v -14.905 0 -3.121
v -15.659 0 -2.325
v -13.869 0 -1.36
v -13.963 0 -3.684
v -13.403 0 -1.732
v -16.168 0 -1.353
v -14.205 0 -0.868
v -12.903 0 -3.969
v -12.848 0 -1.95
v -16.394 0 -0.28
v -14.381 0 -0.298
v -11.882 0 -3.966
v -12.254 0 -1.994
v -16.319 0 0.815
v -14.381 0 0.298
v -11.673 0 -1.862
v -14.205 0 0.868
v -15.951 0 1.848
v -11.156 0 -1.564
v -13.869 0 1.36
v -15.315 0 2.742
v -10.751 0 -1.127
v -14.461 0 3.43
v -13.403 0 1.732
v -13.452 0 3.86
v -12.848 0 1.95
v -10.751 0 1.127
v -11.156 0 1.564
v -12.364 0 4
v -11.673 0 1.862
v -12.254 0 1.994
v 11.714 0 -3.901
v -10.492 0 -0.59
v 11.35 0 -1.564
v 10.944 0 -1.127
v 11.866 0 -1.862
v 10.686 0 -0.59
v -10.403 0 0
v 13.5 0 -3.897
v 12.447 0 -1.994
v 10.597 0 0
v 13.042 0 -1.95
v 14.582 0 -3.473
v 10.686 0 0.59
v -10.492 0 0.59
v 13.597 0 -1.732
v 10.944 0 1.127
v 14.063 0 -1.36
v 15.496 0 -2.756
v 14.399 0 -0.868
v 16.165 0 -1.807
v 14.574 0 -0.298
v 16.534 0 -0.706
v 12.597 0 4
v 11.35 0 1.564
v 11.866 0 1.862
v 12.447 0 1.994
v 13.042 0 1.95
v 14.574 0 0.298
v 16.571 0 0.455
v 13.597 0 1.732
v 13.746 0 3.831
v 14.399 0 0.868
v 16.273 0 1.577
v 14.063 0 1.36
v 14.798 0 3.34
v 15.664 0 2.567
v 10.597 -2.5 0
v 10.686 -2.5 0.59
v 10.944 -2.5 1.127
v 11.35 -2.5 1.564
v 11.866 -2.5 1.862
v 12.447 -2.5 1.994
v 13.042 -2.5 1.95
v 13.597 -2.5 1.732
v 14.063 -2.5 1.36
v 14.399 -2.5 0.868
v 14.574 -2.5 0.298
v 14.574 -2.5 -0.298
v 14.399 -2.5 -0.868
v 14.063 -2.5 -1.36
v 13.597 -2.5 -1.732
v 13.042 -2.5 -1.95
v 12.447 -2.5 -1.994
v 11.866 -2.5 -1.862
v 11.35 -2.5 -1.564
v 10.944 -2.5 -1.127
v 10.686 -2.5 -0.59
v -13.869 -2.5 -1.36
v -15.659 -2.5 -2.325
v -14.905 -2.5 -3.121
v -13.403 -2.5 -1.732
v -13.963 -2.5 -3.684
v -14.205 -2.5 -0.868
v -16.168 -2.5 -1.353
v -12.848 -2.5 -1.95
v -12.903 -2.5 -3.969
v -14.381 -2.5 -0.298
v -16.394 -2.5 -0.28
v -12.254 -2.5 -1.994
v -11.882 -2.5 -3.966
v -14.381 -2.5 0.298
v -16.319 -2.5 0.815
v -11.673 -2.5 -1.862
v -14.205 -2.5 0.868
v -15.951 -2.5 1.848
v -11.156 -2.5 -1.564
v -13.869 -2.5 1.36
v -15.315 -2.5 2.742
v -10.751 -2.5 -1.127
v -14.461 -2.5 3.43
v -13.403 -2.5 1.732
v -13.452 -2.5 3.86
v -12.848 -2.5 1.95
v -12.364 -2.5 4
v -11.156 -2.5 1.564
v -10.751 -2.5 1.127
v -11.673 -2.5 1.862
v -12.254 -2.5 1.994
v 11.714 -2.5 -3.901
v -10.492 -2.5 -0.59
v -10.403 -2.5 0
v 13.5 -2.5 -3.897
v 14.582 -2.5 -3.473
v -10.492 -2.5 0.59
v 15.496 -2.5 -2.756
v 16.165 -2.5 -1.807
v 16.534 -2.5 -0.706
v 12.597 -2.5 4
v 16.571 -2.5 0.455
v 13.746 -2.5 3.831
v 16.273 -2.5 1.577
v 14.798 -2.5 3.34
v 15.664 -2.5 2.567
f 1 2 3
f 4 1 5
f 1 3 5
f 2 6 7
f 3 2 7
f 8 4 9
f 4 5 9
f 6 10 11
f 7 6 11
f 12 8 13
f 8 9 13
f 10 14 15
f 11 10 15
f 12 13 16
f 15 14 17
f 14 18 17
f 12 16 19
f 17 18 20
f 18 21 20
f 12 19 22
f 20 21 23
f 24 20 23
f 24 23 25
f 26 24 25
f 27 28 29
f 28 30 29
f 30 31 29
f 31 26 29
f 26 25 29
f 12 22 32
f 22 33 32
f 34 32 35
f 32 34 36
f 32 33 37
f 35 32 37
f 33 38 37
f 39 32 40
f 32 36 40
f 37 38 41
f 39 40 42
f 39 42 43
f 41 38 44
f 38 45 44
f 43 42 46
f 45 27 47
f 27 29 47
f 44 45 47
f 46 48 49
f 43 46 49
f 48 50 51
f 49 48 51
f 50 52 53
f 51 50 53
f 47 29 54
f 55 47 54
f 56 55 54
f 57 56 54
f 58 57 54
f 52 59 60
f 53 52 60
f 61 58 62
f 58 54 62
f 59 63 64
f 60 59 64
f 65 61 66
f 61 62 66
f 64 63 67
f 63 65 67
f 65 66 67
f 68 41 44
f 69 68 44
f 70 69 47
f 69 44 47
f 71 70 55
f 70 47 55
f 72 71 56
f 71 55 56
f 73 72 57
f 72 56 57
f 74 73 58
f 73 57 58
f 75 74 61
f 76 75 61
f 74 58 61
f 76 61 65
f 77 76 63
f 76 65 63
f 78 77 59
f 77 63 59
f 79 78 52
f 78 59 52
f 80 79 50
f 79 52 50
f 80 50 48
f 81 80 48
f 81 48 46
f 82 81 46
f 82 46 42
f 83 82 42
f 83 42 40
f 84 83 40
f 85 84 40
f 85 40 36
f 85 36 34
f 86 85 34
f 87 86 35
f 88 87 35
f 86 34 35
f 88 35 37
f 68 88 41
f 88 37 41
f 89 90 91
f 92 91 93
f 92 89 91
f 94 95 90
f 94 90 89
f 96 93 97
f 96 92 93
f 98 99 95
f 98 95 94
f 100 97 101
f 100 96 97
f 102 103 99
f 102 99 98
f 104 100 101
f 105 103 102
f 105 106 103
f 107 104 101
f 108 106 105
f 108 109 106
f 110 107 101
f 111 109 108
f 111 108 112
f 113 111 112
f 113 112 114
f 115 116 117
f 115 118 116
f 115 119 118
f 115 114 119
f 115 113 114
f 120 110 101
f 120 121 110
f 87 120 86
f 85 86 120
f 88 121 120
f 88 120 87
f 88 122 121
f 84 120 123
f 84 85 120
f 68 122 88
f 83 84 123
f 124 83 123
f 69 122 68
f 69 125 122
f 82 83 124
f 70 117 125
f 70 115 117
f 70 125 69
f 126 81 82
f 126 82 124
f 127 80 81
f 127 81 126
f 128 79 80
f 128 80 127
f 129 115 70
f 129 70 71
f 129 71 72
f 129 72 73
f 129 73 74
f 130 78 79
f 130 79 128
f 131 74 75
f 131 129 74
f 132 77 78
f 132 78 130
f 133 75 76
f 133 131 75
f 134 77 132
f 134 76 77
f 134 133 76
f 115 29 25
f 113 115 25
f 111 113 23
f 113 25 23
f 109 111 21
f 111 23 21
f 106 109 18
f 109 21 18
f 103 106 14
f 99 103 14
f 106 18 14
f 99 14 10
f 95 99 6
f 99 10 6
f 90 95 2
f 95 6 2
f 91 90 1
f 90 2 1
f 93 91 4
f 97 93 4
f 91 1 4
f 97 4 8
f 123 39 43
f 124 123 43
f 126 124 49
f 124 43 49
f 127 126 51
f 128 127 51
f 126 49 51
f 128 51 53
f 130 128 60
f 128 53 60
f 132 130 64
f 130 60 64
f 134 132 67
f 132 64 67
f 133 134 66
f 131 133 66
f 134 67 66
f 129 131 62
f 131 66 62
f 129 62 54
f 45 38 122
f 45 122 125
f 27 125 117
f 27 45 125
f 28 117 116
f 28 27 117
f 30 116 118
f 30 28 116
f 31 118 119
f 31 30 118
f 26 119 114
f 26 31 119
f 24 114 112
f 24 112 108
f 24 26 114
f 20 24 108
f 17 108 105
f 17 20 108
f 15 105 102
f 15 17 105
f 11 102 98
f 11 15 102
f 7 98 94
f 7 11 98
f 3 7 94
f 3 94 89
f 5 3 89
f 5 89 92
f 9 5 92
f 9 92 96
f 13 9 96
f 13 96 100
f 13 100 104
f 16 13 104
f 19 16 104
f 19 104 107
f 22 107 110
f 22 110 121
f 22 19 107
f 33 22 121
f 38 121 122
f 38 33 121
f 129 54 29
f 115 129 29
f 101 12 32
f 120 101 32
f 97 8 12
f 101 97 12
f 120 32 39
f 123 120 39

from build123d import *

# Parameters (mm, degrees)
F0_R     = 2
F1_DEPTH = 2.5


with BuildPart() as f1:
    # F0 (on Front) → F1 (new body)
    with BuildSketch(Plane.XZ):
        with BuildLine():
            Line((12.596618, 4), (-12.363835, 3.999805))
            ThreePointArc((-12.363835, 3.999805), (-16.394213, 0.270214), (-12.903364, -3.968625))
            Line((-12.903364, -3.968625), (-11.881677, -3.965836))
            Line((-11.881677, -3.965836), (11.71409, -3.901421))
            Line((11.71409, -3.901421), (13.500497, -3.896544))
            ThreePointArc((13.500497, -3.896544), (16.5707, 0.45489), (12.596618, 4))
        make_face()
        with Locations((-12.40335, 0)):
            Circle(F0_R, mode=Mode.SUBTRACT)
        with BuildLine():
            ThreePointArc((14.59665, 0), (12.59665, -2), (10.59665, 0))
            ThreePointArc((10.59665, 0), (12.59665, 2), (14.59665, 0))
        make_face(mode=Mode.SUBTRACT)
    extrude(amount=F1_DEPTH)


solid = f1.part
